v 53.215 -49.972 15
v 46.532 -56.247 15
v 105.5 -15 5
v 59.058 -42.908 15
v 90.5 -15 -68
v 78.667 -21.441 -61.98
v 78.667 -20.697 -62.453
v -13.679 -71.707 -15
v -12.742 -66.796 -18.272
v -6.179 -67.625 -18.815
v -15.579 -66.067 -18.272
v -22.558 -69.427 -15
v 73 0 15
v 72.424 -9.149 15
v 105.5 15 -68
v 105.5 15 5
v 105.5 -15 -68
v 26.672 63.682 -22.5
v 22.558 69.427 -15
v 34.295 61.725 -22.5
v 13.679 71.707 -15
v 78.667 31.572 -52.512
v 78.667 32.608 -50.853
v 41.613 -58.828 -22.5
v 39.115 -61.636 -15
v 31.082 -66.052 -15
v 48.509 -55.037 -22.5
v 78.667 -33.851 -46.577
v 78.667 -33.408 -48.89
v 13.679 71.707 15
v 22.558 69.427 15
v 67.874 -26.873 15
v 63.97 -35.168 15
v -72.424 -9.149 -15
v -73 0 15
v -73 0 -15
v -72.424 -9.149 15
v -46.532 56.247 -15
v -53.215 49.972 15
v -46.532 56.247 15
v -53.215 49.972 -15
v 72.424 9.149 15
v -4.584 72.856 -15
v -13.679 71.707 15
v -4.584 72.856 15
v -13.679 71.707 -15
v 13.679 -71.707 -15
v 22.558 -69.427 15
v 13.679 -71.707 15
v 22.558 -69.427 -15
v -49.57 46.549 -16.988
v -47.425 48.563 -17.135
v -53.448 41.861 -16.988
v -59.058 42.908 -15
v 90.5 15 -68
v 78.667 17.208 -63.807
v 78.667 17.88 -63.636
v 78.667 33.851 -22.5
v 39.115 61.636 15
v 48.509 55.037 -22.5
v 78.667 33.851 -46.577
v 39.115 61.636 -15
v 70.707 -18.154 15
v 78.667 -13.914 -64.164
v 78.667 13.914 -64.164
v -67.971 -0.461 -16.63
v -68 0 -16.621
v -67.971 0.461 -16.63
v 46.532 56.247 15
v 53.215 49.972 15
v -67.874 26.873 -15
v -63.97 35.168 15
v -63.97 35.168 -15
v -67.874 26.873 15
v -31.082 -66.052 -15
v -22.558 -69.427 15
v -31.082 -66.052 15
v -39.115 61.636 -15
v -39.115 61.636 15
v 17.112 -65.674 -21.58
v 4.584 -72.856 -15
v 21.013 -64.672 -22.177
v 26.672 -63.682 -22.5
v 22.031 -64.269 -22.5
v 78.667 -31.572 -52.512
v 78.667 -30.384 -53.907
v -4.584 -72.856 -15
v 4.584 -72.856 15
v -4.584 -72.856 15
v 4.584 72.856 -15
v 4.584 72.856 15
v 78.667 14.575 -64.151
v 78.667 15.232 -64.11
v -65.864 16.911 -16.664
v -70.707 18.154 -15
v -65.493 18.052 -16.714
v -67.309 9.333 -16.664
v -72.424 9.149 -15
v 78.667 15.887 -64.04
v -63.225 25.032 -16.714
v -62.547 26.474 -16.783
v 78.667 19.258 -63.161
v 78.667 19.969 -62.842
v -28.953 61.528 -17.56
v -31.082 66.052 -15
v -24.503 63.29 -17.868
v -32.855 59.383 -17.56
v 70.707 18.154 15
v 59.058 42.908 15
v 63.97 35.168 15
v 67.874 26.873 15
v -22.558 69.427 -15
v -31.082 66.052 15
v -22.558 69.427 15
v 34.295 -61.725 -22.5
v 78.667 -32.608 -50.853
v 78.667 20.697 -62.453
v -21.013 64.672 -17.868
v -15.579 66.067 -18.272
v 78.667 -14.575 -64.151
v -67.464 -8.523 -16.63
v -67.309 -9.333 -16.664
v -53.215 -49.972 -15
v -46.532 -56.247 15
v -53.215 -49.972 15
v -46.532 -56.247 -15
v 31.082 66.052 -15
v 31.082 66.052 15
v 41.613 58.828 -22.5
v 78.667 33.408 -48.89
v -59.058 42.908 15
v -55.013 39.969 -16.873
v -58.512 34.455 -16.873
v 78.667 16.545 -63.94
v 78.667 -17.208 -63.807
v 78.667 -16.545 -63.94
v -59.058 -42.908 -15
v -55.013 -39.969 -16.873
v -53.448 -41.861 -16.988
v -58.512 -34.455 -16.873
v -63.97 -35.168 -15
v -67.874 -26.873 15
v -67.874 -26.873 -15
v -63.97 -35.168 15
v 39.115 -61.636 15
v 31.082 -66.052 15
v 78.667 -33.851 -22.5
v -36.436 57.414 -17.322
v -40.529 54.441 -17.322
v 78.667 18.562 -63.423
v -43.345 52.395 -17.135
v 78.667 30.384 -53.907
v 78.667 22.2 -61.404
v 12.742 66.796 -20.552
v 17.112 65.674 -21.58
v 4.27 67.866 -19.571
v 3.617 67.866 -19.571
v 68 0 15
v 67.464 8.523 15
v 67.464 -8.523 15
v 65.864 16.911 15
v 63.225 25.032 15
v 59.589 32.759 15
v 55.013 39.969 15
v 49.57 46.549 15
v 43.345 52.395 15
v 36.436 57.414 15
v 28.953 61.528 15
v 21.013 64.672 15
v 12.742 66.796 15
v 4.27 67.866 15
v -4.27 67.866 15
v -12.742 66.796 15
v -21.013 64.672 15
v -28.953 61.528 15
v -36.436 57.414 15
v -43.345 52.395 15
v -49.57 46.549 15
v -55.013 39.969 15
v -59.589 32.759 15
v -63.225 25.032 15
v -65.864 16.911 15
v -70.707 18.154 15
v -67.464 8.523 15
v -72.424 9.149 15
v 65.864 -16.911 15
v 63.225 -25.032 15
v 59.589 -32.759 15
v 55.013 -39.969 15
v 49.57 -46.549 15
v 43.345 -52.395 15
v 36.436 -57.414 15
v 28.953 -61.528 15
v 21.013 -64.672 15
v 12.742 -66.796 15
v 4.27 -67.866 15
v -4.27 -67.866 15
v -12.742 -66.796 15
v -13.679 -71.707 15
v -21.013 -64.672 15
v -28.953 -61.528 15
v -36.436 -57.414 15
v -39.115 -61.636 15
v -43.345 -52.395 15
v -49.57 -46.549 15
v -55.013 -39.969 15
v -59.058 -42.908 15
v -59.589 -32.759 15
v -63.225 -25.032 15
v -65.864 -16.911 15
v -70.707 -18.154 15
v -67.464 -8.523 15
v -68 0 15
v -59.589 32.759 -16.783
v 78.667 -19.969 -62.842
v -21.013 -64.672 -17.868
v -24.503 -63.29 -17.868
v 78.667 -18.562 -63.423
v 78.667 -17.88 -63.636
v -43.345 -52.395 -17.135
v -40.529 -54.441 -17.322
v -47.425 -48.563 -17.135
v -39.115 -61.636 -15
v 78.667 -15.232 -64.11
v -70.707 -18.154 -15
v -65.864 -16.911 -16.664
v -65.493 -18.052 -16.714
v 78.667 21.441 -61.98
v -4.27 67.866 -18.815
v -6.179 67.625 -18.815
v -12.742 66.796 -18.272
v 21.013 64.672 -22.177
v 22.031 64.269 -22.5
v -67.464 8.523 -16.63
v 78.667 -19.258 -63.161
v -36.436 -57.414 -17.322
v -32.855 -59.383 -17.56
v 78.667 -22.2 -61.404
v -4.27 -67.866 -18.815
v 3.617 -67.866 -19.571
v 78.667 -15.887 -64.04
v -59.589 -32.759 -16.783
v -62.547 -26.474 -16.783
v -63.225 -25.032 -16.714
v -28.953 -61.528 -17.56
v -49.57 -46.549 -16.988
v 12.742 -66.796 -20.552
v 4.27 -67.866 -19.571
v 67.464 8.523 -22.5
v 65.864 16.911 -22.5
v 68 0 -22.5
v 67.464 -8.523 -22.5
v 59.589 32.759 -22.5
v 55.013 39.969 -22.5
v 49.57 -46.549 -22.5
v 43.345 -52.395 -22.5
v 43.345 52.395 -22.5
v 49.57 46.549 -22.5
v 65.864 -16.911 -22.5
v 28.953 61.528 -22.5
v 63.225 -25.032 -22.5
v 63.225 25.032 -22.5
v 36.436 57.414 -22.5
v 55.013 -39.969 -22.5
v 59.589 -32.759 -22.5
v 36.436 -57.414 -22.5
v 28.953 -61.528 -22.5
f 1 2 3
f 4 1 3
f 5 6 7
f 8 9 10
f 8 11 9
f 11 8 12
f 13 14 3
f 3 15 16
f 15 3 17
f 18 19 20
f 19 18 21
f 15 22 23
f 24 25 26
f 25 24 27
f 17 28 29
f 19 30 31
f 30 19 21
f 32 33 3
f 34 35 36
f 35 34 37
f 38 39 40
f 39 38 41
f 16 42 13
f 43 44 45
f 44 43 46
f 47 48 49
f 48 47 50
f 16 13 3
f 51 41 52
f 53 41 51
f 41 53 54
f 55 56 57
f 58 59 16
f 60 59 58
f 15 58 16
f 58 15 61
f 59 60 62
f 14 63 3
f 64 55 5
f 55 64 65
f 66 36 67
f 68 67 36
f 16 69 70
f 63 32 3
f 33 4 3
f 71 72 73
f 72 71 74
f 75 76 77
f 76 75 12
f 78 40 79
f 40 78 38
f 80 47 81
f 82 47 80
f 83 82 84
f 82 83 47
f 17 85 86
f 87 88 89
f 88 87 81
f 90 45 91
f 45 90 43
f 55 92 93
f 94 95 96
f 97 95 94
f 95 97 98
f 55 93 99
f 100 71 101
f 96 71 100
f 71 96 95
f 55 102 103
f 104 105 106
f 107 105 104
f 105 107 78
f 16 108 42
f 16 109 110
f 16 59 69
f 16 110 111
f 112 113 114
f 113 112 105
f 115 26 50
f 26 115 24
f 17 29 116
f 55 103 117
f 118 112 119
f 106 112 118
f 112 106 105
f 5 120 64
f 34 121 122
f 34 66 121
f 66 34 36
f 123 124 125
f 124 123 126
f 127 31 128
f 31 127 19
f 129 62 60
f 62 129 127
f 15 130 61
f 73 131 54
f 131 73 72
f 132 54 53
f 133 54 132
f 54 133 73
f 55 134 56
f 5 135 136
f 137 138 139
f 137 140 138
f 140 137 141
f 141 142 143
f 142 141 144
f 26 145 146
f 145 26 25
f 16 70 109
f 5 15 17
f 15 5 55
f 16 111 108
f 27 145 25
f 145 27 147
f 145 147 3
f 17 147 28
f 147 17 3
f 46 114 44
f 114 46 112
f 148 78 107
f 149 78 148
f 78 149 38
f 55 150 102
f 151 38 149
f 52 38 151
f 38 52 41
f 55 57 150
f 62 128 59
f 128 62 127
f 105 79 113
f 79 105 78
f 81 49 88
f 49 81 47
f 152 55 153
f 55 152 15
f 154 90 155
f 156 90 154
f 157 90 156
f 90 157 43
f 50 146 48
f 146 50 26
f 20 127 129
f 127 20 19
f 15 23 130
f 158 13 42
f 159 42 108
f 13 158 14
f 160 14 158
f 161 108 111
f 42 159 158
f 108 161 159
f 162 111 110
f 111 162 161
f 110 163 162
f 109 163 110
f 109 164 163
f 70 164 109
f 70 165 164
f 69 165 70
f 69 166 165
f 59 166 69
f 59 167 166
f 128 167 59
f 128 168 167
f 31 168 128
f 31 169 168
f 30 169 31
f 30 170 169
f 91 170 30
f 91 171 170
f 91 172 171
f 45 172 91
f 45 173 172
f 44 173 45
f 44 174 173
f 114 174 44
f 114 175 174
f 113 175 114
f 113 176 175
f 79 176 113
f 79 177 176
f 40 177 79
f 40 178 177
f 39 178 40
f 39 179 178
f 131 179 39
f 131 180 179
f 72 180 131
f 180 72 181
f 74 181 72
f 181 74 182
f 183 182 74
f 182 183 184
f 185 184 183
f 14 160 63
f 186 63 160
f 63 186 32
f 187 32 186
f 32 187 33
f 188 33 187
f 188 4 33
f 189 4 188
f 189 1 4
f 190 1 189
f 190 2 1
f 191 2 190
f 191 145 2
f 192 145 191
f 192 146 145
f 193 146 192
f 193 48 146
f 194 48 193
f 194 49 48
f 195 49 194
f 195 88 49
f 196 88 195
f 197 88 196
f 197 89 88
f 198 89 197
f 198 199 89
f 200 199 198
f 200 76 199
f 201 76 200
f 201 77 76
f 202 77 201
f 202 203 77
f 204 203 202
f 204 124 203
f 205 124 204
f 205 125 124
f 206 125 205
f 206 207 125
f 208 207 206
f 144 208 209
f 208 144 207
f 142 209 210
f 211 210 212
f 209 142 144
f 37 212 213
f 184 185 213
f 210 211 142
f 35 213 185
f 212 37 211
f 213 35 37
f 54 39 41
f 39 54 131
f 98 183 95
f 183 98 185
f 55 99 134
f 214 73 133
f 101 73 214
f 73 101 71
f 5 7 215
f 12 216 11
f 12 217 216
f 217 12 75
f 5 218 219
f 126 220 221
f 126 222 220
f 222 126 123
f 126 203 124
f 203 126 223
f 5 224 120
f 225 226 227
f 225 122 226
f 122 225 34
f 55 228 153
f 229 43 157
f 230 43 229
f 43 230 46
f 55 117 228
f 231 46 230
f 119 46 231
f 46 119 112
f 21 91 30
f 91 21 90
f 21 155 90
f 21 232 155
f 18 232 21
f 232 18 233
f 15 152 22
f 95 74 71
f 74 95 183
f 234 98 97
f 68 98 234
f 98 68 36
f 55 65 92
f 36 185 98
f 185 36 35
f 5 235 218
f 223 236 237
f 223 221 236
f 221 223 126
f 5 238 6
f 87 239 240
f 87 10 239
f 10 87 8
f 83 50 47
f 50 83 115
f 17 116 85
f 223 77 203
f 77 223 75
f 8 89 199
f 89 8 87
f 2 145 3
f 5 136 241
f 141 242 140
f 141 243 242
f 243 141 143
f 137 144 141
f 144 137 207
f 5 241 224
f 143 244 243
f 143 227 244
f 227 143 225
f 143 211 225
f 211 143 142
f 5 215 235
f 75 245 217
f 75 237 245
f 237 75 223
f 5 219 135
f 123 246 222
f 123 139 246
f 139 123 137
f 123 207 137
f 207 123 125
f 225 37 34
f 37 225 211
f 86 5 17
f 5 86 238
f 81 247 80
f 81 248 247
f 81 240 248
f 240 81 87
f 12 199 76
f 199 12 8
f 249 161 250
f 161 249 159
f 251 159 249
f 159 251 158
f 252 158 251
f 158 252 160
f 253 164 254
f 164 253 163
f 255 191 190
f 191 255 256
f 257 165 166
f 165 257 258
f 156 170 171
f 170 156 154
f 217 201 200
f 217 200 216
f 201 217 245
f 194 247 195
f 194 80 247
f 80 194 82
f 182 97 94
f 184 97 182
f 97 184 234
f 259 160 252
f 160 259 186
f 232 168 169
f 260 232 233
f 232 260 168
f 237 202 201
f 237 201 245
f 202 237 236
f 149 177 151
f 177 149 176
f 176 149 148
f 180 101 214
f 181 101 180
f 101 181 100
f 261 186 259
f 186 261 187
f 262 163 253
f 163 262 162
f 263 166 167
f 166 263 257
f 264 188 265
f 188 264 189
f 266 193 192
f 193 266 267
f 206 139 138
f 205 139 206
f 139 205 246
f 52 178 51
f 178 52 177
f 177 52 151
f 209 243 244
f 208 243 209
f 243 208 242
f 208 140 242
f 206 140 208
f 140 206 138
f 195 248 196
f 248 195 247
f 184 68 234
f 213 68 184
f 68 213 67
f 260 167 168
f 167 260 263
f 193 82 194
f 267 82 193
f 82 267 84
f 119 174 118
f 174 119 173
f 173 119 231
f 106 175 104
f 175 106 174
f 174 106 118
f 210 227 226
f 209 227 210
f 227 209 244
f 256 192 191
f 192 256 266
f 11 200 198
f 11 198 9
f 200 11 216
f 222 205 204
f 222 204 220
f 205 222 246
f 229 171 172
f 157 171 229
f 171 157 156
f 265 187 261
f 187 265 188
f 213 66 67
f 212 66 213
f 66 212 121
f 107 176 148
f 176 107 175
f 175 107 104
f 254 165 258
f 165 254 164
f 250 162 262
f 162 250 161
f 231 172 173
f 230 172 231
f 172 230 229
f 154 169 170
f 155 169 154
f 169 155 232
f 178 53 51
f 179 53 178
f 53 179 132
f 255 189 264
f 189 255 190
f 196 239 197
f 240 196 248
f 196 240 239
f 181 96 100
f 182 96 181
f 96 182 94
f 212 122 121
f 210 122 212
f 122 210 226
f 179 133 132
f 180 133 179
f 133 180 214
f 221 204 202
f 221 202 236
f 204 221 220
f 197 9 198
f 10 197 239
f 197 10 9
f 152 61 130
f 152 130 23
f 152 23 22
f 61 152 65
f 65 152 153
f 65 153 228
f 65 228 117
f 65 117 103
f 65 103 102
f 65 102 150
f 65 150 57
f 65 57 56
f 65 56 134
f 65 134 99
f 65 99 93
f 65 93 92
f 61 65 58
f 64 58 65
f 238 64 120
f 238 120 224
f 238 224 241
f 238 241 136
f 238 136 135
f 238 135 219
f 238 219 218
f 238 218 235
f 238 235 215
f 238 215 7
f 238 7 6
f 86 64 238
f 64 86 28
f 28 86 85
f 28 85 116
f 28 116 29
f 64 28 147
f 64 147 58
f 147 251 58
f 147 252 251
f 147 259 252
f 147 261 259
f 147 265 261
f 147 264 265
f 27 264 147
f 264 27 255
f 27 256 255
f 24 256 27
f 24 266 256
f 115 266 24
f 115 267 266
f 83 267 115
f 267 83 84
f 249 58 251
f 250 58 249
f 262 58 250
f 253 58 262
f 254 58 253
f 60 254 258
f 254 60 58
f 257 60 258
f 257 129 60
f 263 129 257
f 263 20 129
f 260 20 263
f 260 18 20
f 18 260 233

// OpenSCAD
$fn=50;

h=30;
d1=73;
d2=d1-5;

module grip(){hull(){translate([d1,0,0])cube([h+5,h,(h-10)/2],center=true);cylinder(h,d1,d1,center=true);}}
module handle(){translate([h+d2,0,-(d2-5)/2])cube([h/2,h,d1],center=true);}
module combined(){hull(){grip();handle();}}
module holder(){difference(){combined();cylinder(100*h,d2,d2,center=true);}}
difference(){holder();translate([d1/1.5,0,-1.75*h])cube([2*h,2.5*d1,2*h],center=true);}
